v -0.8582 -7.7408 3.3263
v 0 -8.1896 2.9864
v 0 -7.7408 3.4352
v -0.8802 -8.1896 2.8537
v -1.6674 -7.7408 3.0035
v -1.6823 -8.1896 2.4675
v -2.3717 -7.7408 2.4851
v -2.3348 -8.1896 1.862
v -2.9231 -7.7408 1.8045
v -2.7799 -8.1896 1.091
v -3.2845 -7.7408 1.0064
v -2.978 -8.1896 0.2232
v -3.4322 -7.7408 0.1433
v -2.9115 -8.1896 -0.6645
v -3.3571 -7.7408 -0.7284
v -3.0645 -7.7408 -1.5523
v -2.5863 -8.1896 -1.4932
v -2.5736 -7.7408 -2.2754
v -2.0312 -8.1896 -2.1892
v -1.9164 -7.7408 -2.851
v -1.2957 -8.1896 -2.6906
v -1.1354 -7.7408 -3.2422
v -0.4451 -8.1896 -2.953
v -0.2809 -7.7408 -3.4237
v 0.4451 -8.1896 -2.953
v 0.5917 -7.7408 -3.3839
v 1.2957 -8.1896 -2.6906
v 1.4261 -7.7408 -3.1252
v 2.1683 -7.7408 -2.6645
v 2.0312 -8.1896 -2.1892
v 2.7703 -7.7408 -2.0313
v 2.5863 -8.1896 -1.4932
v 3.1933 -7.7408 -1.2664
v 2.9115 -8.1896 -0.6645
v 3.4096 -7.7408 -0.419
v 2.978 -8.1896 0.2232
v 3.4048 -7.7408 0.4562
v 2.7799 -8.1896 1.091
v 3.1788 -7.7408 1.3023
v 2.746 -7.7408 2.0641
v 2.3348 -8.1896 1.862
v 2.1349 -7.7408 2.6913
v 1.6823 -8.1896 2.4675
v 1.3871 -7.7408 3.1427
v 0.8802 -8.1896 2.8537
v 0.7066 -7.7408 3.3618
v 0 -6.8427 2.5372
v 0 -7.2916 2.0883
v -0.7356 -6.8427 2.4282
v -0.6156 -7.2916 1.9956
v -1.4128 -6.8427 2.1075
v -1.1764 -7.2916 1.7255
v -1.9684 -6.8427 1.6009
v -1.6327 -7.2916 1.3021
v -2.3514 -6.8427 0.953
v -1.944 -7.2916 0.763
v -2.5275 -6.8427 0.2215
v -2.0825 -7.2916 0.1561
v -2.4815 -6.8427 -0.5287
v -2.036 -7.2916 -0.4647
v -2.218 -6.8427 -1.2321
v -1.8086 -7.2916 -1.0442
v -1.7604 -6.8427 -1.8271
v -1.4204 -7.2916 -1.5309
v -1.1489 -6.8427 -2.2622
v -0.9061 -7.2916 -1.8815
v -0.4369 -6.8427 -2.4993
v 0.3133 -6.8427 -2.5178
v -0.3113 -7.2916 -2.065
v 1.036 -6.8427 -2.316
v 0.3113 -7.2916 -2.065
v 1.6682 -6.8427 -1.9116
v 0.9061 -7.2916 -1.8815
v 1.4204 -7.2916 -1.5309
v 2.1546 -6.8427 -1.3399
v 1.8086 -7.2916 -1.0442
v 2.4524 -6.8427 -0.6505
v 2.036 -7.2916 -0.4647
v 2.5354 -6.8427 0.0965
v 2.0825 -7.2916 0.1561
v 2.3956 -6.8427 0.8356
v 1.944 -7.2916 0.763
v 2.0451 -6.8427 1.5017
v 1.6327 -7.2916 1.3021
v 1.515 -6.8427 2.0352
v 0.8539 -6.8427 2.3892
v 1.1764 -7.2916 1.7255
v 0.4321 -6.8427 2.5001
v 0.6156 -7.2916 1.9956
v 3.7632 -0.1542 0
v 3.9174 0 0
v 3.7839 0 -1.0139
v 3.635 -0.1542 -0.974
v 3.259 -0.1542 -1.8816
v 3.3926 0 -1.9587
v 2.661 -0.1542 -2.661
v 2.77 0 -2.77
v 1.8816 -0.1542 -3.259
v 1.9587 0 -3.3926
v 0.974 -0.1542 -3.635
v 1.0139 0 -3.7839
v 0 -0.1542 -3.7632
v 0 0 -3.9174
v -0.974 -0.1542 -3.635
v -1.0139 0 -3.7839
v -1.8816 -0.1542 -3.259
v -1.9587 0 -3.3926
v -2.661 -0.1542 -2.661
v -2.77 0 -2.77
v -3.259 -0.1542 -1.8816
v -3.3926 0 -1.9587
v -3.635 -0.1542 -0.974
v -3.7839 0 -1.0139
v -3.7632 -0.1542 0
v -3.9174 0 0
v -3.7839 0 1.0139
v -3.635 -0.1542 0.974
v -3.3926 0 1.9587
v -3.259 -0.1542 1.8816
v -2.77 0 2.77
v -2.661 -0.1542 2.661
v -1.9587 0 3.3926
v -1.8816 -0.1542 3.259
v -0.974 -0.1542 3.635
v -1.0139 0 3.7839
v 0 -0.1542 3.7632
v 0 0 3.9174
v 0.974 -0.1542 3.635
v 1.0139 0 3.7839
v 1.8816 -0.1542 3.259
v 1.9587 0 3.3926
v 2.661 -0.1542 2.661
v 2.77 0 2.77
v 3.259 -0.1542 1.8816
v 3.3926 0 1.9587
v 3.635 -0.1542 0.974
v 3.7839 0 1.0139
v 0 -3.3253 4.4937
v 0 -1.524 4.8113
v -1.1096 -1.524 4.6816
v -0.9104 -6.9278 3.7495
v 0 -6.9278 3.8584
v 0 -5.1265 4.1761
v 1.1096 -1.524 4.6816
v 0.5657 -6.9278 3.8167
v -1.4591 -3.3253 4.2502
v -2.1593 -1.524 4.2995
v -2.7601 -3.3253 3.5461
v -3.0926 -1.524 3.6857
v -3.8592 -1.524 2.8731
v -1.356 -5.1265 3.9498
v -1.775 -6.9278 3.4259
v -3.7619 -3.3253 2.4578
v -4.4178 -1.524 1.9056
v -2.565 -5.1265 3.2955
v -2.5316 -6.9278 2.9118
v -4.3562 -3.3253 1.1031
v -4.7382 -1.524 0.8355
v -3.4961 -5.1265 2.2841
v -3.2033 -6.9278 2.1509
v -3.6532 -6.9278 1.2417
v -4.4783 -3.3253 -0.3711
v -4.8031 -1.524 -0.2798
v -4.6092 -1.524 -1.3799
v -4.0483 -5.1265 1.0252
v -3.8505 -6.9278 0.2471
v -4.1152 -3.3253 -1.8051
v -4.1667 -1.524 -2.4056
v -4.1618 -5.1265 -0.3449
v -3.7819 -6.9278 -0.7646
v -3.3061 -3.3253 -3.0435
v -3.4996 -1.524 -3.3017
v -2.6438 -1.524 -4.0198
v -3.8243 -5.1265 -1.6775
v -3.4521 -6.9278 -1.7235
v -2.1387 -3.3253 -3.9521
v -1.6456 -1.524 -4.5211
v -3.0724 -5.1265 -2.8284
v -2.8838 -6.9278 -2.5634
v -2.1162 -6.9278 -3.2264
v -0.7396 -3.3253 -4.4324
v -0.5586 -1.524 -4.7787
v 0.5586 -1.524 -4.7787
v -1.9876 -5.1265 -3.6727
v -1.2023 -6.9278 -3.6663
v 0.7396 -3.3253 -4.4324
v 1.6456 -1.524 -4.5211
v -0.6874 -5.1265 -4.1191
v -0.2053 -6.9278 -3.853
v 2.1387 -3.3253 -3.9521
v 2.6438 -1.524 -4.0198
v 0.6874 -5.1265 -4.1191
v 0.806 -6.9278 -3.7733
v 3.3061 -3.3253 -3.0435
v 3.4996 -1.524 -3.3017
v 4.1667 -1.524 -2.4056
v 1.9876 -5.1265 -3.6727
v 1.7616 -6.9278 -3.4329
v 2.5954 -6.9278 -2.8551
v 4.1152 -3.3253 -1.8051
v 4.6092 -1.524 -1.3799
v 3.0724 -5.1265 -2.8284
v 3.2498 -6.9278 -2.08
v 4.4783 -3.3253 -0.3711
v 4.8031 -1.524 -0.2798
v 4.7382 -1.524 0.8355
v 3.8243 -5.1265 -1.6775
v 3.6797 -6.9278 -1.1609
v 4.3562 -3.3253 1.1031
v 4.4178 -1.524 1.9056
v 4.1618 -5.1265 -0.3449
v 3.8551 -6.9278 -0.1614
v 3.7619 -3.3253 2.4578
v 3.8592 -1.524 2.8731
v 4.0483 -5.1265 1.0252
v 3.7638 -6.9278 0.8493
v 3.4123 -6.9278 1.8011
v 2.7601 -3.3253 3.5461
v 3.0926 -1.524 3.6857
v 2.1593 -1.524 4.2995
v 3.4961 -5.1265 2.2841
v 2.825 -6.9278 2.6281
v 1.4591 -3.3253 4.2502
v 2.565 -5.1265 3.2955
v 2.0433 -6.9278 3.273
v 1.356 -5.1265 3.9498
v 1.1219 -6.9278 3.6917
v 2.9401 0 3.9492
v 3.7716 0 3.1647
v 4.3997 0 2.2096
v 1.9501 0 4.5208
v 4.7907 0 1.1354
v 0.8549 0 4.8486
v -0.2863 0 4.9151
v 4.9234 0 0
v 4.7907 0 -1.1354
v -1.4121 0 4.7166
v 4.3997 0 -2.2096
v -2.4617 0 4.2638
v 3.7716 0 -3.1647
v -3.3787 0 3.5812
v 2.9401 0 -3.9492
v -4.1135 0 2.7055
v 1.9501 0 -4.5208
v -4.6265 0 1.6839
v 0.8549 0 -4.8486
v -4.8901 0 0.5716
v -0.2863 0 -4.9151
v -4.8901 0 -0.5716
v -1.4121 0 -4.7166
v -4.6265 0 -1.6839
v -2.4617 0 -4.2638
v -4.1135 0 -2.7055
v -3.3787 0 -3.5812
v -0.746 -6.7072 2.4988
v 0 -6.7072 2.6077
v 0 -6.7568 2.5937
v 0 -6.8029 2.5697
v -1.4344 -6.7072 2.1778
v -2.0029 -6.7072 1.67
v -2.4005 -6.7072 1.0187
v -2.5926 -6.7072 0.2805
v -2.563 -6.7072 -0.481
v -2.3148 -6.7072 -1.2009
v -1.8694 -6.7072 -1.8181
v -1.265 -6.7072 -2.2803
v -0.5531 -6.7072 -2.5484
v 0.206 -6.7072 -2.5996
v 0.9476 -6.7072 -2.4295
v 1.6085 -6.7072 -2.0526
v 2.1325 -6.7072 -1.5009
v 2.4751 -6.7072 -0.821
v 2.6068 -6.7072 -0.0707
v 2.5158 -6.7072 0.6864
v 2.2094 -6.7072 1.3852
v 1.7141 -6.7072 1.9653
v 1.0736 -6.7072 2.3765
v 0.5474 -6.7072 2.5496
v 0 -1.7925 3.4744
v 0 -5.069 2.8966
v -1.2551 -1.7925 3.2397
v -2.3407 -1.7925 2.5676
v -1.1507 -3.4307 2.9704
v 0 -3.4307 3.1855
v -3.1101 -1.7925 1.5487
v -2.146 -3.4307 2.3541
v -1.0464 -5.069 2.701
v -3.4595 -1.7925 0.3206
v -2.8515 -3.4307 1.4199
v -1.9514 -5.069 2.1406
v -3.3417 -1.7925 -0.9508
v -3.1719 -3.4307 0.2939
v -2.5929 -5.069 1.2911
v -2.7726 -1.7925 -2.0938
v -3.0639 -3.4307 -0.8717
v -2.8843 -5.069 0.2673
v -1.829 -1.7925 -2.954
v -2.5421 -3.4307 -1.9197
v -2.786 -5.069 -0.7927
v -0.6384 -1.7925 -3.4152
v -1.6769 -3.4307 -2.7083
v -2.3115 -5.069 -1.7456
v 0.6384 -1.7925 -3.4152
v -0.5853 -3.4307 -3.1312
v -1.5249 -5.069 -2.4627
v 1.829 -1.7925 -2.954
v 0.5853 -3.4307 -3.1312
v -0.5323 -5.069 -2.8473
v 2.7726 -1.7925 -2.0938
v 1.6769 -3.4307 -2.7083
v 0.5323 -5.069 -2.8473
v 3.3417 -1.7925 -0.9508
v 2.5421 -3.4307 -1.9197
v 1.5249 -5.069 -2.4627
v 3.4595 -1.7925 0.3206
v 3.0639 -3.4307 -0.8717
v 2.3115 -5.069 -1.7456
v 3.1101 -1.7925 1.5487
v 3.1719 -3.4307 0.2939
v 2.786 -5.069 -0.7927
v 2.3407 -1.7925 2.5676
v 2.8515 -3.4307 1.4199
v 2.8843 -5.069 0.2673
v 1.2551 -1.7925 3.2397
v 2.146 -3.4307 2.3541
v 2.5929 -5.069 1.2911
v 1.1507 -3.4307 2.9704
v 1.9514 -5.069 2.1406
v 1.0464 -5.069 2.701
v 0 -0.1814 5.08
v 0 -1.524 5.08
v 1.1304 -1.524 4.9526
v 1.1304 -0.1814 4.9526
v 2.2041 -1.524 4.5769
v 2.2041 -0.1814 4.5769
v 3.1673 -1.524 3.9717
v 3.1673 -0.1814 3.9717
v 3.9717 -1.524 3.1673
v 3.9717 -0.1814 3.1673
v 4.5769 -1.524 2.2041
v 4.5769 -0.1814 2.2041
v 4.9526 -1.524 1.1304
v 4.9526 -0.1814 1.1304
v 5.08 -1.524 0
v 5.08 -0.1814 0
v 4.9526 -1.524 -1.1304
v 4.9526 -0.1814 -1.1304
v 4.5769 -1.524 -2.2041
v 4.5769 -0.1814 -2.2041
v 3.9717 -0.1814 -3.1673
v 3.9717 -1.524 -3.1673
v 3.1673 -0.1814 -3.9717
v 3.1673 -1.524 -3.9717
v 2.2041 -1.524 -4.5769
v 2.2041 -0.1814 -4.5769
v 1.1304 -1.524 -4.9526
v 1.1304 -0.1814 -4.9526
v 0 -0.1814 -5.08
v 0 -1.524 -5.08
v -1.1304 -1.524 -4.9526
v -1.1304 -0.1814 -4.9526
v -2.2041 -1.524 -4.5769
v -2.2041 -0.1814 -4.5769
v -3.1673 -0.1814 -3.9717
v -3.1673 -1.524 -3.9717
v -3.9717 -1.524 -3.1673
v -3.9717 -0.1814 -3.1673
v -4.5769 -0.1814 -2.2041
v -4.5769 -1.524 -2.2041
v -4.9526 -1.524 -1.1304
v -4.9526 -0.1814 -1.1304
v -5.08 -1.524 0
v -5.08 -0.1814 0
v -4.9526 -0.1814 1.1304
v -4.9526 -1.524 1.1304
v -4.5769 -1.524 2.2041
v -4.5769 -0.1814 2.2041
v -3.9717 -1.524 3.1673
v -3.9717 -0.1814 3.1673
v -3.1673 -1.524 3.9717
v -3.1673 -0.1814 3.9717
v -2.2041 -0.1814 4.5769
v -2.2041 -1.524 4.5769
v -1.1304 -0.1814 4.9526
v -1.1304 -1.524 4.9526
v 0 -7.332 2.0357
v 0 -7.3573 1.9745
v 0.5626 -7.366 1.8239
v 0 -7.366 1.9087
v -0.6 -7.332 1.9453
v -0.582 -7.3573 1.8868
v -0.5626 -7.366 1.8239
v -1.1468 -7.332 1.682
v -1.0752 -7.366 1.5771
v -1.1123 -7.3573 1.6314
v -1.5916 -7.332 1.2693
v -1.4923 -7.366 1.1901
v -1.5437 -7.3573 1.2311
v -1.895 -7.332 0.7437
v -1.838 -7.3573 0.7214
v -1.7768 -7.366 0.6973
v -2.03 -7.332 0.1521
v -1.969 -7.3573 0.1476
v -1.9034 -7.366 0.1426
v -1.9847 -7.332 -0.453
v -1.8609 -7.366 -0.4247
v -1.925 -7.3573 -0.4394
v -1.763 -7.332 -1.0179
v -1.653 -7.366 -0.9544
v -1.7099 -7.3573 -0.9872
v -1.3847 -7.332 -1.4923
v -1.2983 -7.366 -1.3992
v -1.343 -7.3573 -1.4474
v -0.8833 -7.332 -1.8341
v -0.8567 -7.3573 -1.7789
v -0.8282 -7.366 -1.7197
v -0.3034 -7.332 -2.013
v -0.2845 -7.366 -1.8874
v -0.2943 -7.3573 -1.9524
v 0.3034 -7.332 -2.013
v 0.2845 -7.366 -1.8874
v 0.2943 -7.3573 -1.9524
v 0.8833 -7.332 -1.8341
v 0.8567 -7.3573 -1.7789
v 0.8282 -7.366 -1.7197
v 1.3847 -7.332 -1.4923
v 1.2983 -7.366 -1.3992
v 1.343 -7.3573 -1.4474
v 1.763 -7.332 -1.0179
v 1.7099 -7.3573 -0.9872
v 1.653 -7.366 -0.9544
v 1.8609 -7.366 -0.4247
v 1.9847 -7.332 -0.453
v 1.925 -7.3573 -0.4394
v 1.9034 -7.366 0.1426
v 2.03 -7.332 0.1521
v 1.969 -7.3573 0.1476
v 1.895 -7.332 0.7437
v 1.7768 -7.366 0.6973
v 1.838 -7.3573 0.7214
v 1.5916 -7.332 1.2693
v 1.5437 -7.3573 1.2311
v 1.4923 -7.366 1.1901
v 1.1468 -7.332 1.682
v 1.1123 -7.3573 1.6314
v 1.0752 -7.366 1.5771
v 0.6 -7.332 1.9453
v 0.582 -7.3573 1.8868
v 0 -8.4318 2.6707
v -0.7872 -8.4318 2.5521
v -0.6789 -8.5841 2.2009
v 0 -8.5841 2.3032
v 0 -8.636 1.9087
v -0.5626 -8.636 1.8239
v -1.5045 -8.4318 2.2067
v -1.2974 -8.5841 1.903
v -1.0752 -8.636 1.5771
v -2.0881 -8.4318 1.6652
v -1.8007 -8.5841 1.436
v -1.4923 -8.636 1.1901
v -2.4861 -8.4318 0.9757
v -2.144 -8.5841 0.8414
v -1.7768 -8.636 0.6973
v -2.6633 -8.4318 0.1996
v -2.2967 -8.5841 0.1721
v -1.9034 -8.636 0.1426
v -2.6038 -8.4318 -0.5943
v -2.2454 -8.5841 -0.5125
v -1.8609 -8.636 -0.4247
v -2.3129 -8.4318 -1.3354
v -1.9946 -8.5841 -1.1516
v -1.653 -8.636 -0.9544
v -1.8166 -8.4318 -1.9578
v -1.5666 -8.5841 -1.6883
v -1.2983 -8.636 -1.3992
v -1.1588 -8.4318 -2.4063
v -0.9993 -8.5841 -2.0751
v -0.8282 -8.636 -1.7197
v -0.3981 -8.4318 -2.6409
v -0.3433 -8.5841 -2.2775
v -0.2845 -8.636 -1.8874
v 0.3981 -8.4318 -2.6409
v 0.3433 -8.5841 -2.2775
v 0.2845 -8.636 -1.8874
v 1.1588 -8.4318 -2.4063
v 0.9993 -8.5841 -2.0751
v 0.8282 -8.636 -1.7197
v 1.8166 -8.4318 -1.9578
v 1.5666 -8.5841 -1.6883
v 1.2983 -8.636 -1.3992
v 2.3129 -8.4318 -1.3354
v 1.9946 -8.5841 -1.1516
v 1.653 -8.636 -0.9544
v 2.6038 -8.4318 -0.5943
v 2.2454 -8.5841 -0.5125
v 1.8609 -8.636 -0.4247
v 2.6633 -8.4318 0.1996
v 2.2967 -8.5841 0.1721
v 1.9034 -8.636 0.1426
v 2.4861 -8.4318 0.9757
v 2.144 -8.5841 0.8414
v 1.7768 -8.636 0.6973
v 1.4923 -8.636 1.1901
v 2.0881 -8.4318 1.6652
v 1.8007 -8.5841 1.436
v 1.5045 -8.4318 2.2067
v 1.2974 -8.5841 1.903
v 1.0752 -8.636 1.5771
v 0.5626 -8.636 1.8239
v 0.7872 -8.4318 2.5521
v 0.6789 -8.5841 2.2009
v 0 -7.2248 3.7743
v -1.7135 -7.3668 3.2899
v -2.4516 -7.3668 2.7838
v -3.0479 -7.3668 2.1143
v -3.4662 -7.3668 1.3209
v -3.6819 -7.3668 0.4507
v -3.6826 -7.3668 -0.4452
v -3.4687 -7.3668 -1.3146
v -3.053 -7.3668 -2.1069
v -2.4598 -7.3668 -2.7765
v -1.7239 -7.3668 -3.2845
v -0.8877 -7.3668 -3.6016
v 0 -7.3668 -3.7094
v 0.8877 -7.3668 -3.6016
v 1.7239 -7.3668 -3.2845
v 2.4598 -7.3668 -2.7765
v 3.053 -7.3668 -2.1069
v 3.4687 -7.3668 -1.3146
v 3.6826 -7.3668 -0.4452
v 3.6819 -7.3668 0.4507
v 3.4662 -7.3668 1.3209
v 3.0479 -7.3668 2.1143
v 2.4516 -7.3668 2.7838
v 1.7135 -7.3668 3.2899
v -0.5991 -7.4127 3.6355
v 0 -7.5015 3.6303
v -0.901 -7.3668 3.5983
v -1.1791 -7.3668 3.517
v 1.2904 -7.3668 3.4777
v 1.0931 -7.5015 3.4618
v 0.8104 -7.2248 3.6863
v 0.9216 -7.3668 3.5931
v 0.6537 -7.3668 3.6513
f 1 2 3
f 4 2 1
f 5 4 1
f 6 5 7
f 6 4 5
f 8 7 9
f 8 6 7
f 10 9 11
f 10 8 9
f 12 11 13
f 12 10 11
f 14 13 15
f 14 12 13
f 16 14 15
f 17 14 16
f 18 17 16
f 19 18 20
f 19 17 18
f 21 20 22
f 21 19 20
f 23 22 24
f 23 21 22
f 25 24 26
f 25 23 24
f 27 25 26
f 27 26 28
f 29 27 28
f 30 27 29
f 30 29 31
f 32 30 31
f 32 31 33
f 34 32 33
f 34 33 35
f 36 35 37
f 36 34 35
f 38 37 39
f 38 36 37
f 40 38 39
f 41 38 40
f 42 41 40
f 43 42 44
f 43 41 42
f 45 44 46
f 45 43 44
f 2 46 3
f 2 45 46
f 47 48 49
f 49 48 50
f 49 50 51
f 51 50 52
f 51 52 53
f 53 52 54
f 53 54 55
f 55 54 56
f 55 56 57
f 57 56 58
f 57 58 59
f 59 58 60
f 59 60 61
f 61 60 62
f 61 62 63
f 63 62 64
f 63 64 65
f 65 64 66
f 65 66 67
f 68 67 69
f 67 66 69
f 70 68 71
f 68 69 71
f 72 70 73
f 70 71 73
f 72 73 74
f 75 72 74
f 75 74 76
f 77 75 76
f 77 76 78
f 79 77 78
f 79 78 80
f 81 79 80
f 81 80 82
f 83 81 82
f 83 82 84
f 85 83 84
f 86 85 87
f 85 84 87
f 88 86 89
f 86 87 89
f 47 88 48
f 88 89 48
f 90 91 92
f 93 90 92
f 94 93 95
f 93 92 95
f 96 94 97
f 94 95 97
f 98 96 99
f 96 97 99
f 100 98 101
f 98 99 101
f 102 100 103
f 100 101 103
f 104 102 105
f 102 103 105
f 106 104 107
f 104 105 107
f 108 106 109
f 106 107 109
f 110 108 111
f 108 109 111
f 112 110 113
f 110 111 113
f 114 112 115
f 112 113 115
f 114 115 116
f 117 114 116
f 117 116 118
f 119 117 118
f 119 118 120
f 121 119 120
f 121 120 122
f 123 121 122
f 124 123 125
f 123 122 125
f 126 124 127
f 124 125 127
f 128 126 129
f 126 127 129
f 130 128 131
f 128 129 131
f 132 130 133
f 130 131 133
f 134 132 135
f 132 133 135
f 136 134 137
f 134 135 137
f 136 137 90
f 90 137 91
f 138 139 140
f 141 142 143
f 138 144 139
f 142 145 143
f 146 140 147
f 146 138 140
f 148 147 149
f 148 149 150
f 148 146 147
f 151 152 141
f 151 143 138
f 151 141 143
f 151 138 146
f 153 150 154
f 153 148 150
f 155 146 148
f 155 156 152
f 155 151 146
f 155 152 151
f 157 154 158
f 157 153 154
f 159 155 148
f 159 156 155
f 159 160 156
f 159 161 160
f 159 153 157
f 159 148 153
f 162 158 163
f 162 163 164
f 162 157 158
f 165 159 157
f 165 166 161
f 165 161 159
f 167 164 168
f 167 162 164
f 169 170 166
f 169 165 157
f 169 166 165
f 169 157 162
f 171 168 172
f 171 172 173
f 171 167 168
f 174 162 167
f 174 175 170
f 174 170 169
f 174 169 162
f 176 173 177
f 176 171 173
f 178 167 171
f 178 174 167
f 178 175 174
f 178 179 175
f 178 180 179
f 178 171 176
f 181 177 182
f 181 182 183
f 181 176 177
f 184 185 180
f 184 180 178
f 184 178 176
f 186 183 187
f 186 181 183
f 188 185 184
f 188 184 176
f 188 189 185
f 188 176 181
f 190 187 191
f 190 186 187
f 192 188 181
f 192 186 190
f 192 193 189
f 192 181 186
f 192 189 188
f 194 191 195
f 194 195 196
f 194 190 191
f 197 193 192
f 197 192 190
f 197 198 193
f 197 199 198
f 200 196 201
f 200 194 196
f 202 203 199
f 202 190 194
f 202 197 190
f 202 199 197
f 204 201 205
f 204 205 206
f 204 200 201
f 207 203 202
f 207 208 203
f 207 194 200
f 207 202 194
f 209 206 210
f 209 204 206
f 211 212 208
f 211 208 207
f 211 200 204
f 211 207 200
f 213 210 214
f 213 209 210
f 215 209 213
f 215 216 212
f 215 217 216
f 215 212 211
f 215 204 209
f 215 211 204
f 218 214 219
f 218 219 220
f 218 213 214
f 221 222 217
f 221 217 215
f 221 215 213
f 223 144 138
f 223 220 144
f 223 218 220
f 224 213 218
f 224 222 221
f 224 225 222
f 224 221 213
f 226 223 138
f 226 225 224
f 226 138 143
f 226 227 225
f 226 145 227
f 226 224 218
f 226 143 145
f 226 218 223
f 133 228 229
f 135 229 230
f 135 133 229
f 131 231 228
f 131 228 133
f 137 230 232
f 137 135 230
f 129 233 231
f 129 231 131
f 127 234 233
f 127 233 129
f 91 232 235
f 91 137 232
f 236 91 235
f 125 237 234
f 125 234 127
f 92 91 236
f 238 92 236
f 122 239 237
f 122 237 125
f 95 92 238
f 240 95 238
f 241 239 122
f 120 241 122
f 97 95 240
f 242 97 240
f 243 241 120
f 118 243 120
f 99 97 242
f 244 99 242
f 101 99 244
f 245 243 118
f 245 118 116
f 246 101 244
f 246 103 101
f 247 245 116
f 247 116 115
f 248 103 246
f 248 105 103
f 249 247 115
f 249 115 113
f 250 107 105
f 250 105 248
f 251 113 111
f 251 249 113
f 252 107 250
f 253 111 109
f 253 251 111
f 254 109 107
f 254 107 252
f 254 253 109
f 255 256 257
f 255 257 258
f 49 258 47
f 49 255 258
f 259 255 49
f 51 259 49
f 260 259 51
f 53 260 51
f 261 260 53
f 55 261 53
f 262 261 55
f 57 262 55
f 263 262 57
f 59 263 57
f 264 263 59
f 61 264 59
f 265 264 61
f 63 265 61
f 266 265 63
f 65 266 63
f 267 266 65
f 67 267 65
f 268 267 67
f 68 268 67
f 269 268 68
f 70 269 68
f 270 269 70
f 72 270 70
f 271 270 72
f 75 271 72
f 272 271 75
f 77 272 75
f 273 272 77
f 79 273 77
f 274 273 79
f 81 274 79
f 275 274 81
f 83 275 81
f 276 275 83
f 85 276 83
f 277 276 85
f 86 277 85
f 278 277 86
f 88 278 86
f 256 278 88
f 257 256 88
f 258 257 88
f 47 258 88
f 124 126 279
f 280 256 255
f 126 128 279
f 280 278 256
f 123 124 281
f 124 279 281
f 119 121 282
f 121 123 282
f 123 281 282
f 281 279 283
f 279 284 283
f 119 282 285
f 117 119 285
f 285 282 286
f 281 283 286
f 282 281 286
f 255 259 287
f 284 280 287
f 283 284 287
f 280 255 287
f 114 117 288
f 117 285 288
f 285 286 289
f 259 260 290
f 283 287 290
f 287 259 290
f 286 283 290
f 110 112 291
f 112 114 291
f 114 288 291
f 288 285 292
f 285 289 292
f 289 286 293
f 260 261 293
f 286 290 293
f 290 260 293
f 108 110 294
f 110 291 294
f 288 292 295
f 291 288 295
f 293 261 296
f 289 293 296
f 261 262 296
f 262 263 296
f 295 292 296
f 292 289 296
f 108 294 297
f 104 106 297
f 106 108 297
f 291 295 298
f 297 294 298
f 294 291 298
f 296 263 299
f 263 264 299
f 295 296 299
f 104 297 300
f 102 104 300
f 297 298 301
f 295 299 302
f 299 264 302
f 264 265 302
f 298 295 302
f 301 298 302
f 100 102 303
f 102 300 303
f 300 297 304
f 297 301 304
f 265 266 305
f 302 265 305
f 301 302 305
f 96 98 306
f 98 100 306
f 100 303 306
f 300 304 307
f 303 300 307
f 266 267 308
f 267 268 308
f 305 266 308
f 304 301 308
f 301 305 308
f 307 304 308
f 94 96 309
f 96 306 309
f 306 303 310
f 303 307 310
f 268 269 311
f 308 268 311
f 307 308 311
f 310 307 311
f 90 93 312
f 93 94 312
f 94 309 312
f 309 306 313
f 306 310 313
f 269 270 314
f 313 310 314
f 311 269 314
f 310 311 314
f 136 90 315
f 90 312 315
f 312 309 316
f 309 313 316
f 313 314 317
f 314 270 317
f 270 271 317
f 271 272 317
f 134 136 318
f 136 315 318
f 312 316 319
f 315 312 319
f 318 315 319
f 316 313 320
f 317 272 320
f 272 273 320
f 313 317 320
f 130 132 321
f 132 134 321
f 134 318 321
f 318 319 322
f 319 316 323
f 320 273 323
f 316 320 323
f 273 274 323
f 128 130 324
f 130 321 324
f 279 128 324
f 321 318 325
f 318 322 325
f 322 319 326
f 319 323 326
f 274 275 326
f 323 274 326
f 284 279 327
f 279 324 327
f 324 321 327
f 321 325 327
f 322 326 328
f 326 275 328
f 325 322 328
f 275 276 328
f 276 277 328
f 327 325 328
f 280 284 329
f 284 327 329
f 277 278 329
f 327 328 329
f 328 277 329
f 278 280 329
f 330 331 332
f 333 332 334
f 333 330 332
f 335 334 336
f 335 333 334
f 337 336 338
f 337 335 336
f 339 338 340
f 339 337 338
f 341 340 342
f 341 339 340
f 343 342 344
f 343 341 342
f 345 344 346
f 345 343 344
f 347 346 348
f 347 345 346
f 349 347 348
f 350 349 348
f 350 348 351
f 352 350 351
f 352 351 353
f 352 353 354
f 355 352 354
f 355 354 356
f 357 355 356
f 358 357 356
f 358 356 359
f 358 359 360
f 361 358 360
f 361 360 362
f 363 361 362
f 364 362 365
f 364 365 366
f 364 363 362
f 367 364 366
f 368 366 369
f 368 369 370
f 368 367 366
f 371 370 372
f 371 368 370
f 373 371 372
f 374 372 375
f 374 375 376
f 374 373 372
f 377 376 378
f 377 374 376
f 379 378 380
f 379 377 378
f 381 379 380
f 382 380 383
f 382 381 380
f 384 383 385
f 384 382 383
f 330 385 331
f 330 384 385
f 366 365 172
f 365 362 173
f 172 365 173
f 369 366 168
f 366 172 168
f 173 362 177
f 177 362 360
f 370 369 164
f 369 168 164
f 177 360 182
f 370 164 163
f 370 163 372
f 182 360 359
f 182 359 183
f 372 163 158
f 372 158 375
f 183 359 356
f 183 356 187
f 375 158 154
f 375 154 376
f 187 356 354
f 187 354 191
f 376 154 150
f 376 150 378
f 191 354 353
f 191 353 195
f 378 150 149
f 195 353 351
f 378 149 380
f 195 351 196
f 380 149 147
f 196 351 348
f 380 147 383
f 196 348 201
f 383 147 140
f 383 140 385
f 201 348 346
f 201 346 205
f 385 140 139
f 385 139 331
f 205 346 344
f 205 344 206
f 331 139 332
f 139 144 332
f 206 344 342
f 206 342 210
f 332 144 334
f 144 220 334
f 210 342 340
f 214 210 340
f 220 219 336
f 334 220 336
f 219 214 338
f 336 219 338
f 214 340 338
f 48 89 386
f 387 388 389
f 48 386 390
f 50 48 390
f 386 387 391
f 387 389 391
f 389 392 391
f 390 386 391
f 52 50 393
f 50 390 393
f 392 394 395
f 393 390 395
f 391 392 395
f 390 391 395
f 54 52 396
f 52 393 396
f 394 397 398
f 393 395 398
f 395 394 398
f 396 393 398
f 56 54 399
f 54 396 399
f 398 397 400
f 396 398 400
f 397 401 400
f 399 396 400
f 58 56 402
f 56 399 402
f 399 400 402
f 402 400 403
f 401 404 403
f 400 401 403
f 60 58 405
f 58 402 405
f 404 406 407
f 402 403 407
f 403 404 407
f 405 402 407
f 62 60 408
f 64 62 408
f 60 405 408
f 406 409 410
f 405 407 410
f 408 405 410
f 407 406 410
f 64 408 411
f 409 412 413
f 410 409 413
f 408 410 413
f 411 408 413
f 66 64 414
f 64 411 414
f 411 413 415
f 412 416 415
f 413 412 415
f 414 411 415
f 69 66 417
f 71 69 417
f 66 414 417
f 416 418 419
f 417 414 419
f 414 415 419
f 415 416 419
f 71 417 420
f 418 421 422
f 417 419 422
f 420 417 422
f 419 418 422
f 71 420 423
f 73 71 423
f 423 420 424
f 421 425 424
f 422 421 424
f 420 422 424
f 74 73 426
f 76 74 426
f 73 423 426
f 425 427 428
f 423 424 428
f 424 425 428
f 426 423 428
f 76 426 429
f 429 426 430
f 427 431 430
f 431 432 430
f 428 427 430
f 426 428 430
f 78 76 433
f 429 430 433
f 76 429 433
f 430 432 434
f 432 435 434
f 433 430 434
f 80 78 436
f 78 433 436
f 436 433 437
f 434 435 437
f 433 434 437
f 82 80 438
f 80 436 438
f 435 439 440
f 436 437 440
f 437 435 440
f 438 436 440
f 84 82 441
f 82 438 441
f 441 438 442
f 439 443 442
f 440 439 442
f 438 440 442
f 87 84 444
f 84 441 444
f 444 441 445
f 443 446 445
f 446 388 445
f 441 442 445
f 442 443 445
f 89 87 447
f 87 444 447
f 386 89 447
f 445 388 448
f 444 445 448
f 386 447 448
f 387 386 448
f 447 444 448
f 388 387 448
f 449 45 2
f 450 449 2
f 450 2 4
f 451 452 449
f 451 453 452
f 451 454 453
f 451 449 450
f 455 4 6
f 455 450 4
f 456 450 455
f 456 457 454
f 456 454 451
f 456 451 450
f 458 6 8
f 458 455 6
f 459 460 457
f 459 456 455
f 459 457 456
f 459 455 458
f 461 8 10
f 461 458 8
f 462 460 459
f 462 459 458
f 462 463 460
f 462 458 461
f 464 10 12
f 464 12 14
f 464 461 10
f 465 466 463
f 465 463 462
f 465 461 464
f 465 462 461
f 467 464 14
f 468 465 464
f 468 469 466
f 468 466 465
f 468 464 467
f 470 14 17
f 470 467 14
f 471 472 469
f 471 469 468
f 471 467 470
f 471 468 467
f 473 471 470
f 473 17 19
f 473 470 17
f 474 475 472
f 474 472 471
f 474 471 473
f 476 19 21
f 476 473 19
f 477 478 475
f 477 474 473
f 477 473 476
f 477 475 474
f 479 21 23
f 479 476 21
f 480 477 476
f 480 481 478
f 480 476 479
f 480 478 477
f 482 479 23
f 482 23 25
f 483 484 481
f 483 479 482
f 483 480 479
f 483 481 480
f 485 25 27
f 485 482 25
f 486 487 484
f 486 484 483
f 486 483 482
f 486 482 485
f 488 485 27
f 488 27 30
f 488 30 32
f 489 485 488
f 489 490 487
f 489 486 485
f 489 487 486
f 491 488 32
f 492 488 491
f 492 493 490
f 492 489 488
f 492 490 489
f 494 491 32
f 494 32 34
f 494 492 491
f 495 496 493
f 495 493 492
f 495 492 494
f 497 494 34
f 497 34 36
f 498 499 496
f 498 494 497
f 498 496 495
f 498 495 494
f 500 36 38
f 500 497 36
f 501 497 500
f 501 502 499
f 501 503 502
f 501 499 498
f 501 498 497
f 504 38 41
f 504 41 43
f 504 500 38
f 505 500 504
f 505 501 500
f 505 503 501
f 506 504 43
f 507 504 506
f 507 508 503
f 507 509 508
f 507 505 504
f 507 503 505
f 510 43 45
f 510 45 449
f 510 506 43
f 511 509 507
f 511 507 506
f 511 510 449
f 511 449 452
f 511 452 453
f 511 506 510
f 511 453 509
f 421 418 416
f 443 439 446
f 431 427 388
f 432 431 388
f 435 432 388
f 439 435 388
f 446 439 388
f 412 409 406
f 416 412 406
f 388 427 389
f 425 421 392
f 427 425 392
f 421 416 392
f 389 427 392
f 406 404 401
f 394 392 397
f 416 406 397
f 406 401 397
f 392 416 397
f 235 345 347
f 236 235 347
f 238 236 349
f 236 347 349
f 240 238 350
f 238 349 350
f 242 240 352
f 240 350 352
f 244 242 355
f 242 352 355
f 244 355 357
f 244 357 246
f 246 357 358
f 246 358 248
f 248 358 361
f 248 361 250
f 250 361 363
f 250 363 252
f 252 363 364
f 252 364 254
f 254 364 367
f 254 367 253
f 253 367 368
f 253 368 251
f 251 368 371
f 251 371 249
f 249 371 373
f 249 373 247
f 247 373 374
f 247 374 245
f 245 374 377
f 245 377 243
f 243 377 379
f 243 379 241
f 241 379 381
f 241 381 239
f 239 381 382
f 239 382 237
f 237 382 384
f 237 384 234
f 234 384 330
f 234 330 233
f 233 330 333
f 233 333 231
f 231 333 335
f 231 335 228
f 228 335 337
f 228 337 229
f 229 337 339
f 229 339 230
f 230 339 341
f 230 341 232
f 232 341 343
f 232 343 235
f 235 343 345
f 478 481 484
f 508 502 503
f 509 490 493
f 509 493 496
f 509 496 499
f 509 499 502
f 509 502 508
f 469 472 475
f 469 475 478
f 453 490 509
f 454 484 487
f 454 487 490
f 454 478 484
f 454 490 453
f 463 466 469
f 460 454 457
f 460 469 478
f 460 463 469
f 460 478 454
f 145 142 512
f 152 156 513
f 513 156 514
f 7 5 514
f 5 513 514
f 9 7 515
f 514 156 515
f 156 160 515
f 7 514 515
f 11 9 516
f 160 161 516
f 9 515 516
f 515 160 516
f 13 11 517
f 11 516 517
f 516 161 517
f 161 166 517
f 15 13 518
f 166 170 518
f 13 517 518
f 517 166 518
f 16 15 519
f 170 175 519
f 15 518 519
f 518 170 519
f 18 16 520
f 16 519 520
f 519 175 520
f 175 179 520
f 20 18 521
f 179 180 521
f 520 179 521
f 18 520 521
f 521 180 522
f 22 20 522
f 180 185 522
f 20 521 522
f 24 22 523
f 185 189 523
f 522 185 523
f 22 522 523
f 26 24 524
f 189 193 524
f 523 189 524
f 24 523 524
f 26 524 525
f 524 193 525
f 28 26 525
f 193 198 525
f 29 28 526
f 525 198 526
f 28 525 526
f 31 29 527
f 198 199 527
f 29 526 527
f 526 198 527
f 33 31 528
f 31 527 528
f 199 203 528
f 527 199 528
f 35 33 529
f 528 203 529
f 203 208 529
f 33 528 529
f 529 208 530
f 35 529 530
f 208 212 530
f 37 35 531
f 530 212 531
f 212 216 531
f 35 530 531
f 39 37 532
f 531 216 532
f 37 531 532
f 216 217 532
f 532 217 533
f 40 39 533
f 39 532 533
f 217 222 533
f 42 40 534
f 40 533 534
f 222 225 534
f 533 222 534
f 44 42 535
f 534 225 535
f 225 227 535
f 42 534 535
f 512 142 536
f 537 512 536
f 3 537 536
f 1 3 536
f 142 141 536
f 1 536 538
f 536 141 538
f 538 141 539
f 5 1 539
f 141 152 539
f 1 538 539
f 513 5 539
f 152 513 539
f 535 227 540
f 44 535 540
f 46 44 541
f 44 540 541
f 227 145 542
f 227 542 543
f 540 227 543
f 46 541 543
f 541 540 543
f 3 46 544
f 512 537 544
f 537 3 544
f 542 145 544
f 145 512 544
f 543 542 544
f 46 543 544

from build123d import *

# Parameters (mm, degrees)
FILLET1_R   = 1.524
SHELL1_T    = -1.27
SKETCH2_R   = 5.08
SKETCH2_R_2 = 3.790408203
RIM_DEPTH   = 1.524


with BuildPart() as part:
    # Sketch1 → Body (revolve)
    with BuildSketch(Plane.XY, mode=Mode.PRIVATE) as body_sk:
        Polygon((0, 0), (5.08, 0), (3.775004875, -7.400995125), (2.54, -8.636), (0, -8.636), align=None)
    revolve(body_sk.sketch.rotate(Axis((0, 0, 0), (0, -1, 0)), 90), axis=Axis((0, 0, 0), (0, -1, 0)))

    # Fillet1
    fillet1_edges = [part.edges().sort_by_distance(p)[0] for p in [
        (0, -8.636, -2.54),
        (0, -7.400995125, -3.775004875),
    ]]
    fillet(fillet1_edges, radius=FILLET1_R)

    # Shell1
    shell1_openings = [part.faces().sort_by_distance(p)[0] for p in [
        (0, 0, 0),
    ]]
    offset(amount=SHELL1_T, openings=shell1_openings, kind=Kind.INTERSECTION)

    # Sketch2 → Rim (add)
    with BuildSketch(Plane(origin=(0, 0, 0), x_dir=(-1, 0, 0), z_dir=(0, 1, 0))):
        with Locations(Location((0, 0, 0), (0, 0, 90))):
            Circle(SKETCH2_R)
        Circle(SKETCH2_R_2, mode=Mode.SUBTRACT)
    extrude(amount=-RIM_DEPTH)

    # Chamfer1: read off the stored shape, not the designer's step
    # Chamfer1 outline → Chamfer1 (revolve, cut)
    with BuildSketch(Plane.XY):
        Polygon((5.08, 0), (4.923434012, 0), (5.08, -0.181374797), align=None)
        Polygon((3.763220804, -0.154187398), (3.917408203, 0), (3.763220804, 0), align=None)
    revolve(axis=Axis((0, 0, 0), (0, 1, 0)), mode=Mode.SUBTRACT)


solid = part.part
